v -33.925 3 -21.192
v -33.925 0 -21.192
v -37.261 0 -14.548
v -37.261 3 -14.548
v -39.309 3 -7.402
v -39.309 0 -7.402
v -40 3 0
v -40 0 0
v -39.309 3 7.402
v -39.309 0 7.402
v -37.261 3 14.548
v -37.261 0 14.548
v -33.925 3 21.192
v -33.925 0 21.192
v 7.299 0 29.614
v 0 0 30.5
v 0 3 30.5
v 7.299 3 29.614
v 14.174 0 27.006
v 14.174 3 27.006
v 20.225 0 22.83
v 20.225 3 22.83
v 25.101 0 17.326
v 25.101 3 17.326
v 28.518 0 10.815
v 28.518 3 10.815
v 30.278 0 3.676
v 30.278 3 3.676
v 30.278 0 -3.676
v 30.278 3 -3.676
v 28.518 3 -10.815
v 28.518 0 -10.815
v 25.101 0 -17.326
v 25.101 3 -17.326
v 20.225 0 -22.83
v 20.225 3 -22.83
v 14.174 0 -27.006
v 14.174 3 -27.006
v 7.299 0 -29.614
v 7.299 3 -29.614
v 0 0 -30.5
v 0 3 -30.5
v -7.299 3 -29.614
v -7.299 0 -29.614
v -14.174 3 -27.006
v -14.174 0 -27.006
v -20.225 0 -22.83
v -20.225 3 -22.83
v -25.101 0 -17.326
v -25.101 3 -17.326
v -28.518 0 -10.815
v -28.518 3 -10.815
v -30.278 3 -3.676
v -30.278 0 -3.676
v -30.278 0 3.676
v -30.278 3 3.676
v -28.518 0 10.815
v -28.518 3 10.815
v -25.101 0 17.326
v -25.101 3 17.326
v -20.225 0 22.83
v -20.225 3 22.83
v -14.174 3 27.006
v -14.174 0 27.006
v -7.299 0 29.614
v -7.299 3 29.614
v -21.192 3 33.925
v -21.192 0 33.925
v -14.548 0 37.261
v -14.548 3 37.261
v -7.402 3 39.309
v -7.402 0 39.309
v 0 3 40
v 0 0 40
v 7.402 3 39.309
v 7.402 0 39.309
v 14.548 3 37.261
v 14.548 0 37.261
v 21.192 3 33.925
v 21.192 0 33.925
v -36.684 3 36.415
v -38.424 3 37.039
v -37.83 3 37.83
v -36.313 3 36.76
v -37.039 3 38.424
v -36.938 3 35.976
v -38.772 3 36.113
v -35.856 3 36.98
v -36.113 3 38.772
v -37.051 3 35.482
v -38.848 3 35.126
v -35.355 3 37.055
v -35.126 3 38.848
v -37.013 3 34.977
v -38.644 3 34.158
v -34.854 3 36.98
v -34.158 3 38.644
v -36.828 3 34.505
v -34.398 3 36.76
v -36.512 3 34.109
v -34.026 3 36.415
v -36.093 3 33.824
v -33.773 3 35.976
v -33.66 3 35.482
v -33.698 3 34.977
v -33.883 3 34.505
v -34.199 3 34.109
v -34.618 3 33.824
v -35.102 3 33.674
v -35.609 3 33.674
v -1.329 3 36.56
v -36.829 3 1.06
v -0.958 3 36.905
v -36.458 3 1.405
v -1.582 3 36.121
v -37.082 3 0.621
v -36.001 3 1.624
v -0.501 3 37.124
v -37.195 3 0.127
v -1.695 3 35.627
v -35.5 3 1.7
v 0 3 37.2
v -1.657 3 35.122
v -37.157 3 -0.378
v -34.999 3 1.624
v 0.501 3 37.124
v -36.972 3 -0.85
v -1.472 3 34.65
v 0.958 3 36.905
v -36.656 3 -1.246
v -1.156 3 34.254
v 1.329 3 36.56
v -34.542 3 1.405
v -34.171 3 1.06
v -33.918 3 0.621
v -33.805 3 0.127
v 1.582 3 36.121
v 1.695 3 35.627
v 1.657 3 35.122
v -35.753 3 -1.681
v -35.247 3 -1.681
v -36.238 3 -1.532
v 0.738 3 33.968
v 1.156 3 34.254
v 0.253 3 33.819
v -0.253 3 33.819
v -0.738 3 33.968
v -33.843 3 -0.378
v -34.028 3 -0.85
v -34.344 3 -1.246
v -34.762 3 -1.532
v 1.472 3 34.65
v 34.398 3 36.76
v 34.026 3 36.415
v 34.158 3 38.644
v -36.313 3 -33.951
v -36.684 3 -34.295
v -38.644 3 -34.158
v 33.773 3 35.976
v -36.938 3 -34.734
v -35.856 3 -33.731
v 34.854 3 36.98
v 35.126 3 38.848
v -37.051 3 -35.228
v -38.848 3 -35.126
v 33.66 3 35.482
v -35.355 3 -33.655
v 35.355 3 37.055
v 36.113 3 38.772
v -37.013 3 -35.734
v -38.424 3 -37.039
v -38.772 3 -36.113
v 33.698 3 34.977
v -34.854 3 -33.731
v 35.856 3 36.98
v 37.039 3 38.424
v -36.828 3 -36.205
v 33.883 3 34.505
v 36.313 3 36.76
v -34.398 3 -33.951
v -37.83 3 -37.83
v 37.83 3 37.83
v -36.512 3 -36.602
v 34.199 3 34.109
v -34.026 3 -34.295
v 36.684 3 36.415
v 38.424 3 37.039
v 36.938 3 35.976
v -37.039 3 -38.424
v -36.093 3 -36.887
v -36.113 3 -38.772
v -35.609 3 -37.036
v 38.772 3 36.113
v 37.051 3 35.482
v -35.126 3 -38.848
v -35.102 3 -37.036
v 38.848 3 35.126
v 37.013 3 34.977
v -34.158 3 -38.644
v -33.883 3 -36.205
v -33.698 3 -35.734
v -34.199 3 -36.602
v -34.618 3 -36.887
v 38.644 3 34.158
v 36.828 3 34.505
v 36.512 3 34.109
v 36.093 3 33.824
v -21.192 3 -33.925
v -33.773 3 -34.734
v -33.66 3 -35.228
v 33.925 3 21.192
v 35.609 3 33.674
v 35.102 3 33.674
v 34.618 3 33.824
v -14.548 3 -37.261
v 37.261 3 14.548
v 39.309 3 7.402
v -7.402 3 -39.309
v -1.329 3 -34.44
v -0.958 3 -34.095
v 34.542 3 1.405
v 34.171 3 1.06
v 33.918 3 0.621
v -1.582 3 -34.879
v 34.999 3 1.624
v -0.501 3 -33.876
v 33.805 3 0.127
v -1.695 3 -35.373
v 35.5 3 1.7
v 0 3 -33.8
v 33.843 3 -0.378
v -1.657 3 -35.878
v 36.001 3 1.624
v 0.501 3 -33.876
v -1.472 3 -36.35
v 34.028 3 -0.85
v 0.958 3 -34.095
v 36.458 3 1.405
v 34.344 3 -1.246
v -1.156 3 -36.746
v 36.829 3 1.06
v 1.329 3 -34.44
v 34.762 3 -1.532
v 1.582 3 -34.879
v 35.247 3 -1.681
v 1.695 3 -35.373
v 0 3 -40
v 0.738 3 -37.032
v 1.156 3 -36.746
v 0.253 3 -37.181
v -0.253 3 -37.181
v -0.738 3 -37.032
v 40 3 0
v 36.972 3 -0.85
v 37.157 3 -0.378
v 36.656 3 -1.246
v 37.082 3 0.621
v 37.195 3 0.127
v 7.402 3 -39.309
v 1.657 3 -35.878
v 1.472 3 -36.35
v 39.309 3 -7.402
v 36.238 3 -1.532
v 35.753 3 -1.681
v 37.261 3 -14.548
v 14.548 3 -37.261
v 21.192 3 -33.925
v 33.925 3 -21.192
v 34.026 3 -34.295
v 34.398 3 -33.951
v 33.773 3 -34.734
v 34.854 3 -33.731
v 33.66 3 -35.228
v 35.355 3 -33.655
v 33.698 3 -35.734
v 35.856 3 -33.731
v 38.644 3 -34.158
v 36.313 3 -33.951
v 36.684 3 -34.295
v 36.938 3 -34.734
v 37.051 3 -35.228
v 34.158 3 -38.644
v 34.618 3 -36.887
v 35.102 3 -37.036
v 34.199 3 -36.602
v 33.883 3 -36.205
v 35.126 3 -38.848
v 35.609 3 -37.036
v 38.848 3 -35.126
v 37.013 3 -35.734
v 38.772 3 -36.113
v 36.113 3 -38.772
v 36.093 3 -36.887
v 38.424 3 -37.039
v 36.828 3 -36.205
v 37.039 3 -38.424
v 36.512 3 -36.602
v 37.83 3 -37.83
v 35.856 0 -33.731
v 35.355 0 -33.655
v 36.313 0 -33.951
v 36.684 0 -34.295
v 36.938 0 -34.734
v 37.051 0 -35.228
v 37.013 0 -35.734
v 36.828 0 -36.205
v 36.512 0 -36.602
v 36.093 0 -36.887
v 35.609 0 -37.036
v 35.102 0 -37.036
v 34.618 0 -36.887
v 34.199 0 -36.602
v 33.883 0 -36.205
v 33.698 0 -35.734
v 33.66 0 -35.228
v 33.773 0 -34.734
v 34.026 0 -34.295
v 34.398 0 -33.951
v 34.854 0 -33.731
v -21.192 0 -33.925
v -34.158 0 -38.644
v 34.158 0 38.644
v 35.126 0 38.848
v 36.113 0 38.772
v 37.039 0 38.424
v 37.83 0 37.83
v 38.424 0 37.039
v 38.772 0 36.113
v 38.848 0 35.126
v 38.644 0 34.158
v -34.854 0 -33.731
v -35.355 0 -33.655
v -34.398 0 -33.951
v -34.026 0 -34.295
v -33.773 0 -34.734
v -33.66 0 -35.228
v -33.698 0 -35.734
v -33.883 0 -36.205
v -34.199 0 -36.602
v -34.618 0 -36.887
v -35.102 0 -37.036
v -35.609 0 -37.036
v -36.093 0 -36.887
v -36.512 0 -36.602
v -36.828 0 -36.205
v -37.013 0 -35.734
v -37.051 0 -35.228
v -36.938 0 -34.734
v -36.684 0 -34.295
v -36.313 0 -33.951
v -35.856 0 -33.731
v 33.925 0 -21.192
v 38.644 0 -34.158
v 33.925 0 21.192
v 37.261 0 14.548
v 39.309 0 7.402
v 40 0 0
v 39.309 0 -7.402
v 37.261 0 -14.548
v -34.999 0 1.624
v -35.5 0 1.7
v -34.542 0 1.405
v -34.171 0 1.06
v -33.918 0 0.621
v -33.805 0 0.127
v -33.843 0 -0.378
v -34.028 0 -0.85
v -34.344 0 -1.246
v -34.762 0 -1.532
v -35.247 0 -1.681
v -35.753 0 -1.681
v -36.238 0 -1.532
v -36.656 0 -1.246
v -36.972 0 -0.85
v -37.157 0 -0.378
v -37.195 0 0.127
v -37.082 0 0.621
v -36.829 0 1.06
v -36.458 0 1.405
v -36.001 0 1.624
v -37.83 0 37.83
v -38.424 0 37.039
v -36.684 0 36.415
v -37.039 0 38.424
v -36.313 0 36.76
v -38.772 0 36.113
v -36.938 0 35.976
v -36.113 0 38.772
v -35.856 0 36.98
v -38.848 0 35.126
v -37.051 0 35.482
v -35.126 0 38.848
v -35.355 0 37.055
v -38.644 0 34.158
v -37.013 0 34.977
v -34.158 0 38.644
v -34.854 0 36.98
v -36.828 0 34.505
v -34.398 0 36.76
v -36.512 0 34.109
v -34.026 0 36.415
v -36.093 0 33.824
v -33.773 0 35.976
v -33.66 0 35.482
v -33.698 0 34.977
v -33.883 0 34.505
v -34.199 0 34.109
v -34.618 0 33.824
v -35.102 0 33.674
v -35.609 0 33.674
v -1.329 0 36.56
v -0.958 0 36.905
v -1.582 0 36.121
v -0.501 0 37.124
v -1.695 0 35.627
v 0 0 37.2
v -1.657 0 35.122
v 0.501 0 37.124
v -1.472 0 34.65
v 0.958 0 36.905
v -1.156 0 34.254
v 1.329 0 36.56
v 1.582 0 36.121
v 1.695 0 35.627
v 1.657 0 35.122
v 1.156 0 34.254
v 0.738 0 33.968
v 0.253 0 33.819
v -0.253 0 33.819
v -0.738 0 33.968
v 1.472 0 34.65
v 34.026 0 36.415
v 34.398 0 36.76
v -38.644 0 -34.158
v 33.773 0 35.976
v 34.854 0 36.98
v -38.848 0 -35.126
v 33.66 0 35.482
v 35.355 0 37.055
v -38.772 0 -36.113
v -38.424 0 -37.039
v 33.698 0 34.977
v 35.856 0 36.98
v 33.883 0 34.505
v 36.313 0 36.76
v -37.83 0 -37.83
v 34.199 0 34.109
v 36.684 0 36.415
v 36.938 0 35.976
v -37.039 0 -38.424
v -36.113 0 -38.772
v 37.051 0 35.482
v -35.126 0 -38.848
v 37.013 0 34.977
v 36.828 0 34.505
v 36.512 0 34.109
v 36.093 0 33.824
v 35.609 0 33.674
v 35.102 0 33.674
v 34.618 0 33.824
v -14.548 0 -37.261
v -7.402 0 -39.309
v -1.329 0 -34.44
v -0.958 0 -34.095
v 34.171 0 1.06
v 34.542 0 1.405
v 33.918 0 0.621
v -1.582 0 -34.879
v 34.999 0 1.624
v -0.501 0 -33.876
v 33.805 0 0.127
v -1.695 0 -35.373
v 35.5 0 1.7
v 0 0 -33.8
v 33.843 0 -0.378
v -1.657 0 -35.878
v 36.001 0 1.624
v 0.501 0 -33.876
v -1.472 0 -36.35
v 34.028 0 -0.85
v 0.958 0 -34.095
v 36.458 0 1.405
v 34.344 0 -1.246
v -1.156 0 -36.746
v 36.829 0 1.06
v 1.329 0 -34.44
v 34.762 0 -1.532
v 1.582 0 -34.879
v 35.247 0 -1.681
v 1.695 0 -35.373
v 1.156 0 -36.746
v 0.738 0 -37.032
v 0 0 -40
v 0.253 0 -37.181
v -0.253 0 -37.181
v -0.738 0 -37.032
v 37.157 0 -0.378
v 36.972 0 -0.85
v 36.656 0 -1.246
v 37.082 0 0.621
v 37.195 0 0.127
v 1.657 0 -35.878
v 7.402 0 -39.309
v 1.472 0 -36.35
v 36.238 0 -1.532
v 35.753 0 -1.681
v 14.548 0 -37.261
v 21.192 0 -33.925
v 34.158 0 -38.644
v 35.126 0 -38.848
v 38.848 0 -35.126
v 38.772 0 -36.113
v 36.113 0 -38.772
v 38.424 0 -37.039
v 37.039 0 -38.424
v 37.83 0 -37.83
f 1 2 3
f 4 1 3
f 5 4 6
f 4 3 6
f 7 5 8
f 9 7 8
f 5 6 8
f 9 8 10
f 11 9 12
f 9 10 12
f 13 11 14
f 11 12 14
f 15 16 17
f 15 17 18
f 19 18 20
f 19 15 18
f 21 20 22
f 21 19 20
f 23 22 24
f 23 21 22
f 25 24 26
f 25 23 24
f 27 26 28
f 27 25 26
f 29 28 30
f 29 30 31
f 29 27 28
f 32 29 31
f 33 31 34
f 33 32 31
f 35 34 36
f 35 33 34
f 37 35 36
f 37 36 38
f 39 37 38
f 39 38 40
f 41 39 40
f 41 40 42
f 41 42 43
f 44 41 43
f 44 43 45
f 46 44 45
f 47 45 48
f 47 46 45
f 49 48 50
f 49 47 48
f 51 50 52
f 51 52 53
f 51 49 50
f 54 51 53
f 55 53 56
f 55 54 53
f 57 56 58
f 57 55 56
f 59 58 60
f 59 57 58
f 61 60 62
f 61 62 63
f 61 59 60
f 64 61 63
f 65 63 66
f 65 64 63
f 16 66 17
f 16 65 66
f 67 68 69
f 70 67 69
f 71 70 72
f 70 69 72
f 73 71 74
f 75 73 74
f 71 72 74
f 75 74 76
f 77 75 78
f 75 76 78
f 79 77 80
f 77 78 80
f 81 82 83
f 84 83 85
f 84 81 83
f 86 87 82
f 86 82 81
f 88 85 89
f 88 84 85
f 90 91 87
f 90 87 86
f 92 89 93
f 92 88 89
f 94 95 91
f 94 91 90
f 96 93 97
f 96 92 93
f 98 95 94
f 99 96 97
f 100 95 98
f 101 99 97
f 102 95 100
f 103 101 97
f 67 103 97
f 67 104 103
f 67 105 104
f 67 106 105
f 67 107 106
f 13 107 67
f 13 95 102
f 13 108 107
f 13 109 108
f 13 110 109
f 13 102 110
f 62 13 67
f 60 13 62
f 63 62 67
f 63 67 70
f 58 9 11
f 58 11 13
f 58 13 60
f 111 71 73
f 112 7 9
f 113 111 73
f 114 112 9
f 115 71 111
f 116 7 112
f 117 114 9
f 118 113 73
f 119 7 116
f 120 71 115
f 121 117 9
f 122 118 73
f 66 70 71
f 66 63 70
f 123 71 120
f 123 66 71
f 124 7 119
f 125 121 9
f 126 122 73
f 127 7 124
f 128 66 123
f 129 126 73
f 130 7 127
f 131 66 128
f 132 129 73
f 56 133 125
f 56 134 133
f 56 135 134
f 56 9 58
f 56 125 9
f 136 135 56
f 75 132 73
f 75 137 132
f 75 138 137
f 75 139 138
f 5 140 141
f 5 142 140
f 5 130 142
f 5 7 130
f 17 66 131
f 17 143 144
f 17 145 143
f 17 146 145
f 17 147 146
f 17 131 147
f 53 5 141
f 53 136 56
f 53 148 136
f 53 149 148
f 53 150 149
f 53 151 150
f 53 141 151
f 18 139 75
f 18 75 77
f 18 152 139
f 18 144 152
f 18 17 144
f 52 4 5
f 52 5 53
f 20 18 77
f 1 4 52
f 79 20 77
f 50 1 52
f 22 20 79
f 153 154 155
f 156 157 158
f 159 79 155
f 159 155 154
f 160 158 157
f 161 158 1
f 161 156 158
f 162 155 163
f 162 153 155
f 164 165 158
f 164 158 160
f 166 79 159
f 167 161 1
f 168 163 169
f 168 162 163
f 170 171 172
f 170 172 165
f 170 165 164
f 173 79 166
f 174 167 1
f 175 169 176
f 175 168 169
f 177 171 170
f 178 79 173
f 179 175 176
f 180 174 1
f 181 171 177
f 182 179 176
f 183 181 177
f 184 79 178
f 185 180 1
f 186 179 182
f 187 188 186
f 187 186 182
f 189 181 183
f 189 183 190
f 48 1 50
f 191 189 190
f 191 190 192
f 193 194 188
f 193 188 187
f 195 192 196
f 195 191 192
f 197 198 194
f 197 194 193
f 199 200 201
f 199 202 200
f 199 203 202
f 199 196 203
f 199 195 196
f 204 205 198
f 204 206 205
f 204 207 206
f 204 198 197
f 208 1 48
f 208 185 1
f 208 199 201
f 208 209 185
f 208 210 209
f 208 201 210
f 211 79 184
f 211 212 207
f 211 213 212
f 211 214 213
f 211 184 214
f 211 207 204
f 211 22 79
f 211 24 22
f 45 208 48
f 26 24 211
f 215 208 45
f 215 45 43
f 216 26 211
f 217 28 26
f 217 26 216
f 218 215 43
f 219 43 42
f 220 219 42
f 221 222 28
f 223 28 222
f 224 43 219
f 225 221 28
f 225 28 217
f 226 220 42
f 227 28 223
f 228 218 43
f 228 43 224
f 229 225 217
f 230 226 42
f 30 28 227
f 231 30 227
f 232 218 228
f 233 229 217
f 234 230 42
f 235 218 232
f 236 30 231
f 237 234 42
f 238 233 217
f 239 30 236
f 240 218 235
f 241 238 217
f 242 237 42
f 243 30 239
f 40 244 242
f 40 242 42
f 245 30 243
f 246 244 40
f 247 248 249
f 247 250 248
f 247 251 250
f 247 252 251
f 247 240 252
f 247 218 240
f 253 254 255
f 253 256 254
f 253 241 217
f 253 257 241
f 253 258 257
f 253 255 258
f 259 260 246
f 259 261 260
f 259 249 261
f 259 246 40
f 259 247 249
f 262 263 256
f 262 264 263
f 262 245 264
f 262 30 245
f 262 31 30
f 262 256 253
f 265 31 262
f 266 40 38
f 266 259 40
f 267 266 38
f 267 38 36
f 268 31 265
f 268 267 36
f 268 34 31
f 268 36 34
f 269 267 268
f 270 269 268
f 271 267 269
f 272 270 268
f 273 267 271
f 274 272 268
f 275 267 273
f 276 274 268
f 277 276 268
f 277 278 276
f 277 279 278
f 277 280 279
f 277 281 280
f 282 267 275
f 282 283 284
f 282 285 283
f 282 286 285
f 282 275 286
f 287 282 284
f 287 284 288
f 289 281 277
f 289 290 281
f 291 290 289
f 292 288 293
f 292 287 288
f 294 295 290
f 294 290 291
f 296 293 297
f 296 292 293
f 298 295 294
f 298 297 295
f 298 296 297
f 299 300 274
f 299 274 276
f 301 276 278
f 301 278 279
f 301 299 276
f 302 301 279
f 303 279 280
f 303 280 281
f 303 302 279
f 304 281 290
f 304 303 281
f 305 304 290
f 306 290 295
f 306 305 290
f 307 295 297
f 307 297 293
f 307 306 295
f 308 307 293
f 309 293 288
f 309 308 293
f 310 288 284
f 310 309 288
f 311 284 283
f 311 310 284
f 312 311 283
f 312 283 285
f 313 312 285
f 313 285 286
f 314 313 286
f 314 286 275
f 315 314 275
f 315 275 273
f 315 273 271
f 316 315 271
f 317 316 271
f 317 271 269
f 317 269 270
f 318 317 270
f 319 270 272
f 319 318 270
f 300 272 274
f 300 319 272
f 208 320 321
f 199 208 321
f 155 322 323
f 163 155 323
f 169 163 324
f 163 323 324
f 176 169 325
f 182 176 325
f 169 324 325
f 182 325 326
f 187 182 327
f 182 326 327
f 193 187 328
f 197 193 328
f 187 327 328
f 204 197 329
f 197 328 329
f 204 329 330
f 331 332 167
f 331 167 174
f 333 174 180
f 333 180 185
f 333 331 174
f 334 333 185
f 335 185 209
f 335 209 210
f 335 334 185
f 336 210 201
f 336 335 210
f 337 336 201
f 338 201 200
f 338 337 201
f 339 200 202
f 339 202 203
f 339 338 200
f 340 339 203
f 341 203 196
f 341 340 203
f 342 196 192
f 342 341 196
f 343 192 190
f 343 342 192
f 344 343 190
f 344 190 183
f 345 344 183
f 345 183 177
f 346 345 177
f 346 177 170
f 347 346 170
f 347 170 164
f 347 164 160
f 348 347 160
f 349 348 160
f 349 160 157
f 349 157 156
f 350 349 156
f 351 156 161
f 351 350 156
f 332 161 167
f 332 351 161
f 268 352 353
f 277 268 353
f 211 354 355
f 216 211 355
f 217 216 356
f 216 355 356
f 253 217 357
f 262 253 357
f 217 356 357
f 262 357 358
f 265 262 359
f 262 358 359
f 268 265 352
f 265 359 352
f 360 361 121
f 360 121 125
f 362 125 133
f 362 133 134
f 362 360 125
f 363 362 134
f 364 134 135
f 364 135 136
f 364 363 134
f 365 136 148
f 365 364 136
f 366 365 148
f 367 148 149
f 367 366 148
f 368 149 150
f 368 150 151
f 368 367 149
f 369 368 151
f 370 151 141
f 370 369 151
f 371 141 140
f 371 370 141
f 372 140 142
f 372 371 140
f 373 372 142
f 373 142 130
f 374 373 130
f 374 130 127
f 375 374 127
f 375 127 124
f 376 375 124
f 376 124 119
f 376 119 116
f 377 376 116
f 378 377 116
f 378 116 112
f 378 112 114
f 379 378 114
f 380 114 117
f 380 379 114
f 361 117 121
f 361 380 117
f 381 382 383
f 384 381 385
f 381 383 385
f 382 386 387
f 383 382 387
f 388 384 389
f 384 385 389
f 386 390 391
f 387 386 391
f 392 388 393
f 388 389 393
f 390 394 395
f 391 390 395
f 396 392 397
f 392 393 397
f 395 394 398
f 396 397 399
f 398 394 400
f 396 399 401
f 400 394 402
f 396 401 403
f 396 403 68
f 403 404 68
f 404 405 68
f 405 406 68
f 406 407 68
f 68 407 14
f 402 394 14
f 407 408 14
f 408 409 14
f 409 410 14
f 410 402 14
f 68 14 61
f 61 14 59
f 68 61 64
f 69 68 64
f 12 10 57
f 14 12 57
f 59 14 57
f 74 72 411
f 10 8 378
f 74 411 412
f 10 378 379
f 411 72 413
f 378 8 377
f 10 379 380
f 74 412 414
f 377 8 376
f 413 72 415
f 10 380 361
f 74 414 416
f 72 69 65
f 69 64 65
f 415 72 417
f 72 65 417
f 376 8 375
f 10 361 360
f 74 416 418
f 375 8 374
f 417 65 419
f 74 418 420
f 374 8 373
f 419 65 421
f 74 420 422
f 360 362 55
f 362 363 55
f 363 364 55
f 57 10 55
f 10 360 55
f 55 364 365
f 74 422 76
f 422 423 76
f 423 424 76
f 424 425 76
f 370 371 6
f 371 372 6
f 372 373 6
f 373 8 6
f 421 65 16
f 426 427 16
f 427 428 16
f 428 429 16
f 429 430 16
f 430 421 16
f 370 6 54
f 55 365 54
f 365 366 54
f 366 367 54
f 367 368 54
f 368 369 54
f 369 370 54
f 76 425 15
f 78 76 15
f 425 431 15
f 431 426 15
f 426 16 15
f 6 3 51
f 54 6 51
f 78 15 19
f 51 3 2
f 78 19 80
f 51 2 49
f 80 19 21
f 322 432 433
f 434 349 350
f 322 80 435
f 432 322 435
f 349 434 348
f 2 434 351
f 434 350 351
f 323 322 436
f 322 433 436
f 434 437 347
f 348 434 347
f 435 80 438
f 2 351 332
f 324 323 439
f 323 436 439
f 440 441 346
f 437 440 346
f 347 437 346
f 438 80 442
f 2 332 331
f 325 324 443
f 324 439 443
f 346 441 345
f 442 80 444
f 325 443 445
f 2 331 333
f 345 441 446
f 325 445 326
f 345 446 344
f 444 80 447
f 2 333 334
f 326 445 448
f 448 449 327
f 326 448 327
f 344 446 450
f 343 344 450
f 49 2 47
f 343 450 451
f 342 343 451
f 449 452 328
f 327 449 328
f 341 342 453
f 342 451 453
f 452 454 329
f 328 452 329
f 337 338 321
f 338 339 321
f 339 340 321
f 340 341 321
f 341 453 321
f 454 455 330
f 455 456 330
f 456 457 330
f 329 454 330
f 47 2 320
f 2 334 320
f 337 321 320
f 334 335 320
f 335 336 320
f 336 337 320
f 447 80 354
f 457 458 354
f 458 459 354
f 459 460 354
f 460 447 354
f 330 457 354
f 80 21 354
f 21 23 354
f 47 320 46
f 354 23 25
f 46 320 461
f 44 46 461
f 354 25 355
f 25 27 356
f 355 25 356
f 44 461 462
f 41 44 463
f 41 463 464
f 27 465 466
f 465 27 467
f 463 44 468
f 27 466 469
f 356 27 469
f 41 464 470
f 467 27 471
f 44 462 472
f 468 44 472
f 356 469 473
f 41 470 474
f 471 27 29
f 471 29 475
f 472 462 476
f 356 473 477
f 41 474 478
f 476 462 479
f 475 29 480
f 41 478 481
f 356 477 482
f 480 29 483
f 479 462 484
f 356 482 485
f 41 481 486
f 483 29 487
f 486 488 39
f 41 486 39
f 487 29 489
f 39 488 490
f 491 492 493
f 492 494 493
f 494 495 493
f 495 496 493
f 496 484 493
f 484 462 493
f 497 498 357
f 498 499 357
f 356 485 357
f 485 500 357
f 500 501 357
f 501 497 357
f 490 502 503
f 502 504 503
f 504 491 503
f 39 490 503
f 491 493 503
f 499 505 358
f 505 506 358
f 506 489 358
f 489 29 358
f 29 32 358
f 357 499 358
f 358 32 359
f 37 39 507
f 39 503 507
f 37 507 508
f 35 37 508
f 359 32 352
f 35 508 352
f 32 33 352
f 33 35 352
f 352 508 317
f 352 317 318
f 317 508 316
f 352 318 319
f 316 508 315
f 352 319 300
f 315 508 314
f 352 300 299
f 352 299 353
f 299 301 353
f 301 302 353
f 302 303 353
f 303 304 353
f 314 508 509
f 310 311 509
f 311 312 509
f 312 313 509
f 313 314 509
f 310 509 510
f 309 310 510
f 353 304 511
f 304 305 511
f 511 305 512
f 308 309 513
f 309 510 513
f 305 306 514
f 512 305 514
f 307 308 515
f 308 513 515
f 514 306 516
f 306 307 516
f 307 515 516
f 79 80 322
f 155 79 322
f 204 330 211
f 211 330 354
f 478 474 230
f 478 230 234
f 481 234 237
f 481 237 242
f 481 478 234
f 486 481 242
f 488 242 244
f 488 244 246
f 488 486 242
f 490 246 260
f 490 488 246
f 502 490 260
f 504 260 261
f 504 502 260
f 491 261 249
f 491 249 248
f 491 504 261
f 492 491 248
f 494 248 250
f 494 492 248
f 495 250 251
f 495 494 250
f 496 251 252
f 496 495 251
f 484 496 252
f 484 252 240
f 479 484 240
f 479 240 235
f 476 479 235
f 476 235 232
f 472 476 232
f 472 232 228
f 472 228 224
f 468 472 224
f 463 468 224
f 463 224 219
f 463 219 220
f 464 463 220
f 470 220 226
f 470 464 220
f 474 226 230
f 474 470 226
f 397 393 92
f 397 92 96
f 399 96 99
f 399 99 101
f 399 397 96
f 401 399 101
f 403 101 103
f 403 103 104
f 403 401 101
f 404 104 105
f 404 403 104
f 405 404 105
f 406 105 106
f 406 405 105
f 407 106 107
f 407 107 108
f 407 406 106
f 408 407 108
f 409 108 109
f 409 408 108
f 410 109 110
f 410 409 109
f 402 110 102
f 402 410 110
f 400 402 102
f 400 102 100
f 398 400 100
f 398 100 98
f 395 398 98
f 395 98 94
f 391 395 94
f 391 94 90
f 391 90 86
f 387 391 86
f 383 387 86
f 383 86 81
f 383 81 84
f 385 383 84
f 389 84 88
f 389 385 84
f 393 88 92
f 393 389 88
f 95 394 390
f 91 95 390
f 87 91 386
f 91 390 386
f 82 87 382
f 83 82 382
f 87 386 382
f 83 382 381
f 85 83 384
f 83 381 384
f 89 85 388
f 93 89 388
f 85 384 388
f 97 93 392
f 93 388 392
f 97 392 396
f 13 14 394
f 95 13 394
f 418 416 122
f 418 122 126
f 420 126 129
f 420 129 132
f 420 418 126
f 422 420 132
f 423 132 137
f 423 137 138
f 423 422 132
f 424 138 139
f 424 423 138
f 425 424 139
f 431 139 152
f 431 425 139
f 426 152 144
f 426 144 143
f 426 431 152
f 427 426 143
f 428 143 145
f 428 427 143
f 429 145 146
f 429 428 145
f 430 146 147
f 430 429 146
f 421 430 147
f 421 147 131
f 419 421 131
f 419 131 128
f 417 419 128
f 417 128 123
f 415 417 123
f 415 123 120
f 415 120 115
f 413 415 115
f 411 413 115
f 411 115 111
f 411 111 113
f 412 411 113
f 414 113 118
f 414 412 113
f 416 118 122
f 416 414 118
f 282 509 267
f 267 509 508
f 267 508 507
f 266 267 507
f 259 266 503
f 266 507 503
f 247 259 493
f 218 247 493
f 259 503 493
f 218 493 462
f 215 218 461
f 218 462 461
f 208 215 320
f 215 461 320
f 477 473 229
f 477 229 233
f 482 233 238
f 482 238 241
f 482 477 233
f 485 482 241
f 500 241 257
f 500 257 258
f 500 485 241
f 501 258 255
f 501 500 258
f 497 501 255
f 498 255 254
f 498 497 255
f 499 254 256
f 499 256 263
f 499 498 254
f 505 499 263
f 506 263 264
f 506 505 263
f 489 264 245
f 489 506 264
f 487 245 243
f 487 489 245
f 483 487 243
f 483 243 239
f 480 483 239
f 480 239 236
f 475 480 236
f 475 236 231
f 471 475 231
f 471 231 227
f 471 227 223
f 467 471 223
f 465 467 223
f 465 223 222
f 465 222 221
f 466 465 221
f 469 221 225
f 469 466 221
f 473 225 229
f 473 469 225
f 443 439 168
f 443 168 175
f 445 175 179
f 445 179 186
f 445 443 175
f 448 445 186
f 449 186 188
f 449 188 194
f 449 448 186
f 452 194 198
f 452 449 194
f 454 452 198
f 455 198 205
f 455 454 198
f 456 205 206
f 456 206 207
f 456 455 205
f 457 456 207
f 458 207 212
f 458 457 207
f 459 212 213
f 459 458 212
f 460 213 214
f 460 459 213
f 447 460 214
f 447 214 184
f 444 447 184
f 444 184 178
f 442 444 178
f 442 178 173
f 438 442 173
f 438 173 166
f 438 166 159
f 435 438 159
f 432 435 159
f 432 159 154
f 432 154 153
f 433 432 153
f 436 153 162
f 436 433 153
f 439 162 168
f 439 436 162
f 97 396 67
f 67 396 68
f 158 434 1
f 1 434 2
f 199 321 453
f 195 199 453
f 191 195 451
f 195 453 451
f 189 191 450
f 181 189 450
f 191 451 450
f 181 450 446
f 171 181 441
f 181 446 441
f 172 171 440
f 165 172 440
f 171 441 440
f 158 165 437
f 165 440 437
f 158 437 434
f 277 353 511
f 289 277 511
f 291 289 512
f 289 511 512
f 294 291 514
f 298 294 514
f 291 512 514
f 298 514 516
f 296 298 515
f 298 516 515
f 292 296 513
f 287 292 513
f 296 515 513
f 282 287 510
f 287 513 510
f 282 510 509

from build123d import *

# Parameters (mm, degrees)
SKETCH_1_R      = 30.5
SKETCH_1_R_2    = 1.7
EXTRUDE_1_DEPTH = 3


with BuildPart() as part:
    # 草图1 → 凸台-拉伸1 (new body)
    with BuildSketch(Plane(origin=(0, 0, 0), x_dir=(1, 0, 0), z_dir=(0, 1, 0))):
        with BuildLine():
            Line((34.158268558, 38.644263232), (21.19197667, 33.924918936))
            ThreePointArc((21.19197667, 33.924918936), (0, 40), (-21.19197667, 33.924918936))
            Line((-21.19197667, 33.924918936), (-34.158268558, 38.644263232))
            ThreePointArc((-34.158268558, 38.644263232), (-37.830212793, 37.830212793), (-38.644263232, 34.158268558))
            Line((-38.644263232, 34.158268558), (-33.924918936, 21.19197667))
            ThreePointArc((-33.924918936, 21.19197667), (-40, 0), (-33.924918936, -21.19197667))
            Line((-33.924918936, -21.19197667), (-38.644263232, -34.158268558))
            ThreePointArc((-38.644263232, -34.158268558), (-37.830212793, -37.830212793), (-34.158268558, -38.644263232))
            Line((-34.158268558, -38.644263232), (-21.19197667, -33.924918936))
            ThreePointArc((-21.19197667, -33.924918936), (0, -40), (21.19197667, -33.924918936))
            Line((21.19197667, -33.924918936), (34.158268558, -38.644263232))
            ThreePointArc((34.158268558, -38.644263232), (37.830212793, -37.830212793), (38.644263232, -34.158268558))
            Line((38.644263232, -34.158268558), (33.924918936, -21.19197667))
            ThreePointArc((33.924918936, -21.19197667), (40, 0), (33.924918936, 21.19197667))
            Line((33.924918936, 21.19197667), (38.644263232, 34.158268558))
            ThreePointArc((38.644263232, 34.158268558), (37.830212793, 37.830212793), (34.158268558, 38.644263232))
        make_face()
        with Locations(Location((0, 0, 0), (0, 0, 270))):
            Circle(SKETCH_1_R, mode=Mode.SUBTRACT)
        with Locations(Location((0, 35.5, 0), (0, 0, 270))):
            Circle(SKETCH_1_R_2, mode=Mode.SUBTRACT)
        with Locations(Location((35.5, 0, 0), (0, 0, 270))):
            Circle(SKETCH_1_R_2, mode=Mode.SUBTRACT)
        with Locations(Location((0, -35.5, 0), (0, 0, 270))):
            Circle(SKETCH_1_R_2, mode=Mode.SUBTRACT)
        with Locations(Location((-35.5, 0, 0), (0, 0, 270))):
            Circle(SKETCH_1_R_2, mode=Mode.SUBTRACT)
        with Locations(Location((35.355339059, 35.355339059, 0), (0, 0, 270))):
            Circle(SKETCH_1_R_2, mode=Mode.SUBTRACT)
        with Locations(Location((35.355339059, -35.355339059, 0), (0, 0, 270))):
            Circle(SKETCH_1_R_2, mode=Mode.SUBTRACT)
        with Locations(Location((-35.355339059, -35.355339059, 0), (0, 0, 270))):
            Circle(SKETCH_1_R_2, mode=Mode.SUBTRACT)
        with Locations(Location((-35.355339059, 35.355339059, 0), (0, 0, 270))):
            Circle(SKETCH_1_R_2, mode=Mode.SUBTRACT)
    extrude(amount=EXTRUDE_1_DEPTH)


solid = part.part
